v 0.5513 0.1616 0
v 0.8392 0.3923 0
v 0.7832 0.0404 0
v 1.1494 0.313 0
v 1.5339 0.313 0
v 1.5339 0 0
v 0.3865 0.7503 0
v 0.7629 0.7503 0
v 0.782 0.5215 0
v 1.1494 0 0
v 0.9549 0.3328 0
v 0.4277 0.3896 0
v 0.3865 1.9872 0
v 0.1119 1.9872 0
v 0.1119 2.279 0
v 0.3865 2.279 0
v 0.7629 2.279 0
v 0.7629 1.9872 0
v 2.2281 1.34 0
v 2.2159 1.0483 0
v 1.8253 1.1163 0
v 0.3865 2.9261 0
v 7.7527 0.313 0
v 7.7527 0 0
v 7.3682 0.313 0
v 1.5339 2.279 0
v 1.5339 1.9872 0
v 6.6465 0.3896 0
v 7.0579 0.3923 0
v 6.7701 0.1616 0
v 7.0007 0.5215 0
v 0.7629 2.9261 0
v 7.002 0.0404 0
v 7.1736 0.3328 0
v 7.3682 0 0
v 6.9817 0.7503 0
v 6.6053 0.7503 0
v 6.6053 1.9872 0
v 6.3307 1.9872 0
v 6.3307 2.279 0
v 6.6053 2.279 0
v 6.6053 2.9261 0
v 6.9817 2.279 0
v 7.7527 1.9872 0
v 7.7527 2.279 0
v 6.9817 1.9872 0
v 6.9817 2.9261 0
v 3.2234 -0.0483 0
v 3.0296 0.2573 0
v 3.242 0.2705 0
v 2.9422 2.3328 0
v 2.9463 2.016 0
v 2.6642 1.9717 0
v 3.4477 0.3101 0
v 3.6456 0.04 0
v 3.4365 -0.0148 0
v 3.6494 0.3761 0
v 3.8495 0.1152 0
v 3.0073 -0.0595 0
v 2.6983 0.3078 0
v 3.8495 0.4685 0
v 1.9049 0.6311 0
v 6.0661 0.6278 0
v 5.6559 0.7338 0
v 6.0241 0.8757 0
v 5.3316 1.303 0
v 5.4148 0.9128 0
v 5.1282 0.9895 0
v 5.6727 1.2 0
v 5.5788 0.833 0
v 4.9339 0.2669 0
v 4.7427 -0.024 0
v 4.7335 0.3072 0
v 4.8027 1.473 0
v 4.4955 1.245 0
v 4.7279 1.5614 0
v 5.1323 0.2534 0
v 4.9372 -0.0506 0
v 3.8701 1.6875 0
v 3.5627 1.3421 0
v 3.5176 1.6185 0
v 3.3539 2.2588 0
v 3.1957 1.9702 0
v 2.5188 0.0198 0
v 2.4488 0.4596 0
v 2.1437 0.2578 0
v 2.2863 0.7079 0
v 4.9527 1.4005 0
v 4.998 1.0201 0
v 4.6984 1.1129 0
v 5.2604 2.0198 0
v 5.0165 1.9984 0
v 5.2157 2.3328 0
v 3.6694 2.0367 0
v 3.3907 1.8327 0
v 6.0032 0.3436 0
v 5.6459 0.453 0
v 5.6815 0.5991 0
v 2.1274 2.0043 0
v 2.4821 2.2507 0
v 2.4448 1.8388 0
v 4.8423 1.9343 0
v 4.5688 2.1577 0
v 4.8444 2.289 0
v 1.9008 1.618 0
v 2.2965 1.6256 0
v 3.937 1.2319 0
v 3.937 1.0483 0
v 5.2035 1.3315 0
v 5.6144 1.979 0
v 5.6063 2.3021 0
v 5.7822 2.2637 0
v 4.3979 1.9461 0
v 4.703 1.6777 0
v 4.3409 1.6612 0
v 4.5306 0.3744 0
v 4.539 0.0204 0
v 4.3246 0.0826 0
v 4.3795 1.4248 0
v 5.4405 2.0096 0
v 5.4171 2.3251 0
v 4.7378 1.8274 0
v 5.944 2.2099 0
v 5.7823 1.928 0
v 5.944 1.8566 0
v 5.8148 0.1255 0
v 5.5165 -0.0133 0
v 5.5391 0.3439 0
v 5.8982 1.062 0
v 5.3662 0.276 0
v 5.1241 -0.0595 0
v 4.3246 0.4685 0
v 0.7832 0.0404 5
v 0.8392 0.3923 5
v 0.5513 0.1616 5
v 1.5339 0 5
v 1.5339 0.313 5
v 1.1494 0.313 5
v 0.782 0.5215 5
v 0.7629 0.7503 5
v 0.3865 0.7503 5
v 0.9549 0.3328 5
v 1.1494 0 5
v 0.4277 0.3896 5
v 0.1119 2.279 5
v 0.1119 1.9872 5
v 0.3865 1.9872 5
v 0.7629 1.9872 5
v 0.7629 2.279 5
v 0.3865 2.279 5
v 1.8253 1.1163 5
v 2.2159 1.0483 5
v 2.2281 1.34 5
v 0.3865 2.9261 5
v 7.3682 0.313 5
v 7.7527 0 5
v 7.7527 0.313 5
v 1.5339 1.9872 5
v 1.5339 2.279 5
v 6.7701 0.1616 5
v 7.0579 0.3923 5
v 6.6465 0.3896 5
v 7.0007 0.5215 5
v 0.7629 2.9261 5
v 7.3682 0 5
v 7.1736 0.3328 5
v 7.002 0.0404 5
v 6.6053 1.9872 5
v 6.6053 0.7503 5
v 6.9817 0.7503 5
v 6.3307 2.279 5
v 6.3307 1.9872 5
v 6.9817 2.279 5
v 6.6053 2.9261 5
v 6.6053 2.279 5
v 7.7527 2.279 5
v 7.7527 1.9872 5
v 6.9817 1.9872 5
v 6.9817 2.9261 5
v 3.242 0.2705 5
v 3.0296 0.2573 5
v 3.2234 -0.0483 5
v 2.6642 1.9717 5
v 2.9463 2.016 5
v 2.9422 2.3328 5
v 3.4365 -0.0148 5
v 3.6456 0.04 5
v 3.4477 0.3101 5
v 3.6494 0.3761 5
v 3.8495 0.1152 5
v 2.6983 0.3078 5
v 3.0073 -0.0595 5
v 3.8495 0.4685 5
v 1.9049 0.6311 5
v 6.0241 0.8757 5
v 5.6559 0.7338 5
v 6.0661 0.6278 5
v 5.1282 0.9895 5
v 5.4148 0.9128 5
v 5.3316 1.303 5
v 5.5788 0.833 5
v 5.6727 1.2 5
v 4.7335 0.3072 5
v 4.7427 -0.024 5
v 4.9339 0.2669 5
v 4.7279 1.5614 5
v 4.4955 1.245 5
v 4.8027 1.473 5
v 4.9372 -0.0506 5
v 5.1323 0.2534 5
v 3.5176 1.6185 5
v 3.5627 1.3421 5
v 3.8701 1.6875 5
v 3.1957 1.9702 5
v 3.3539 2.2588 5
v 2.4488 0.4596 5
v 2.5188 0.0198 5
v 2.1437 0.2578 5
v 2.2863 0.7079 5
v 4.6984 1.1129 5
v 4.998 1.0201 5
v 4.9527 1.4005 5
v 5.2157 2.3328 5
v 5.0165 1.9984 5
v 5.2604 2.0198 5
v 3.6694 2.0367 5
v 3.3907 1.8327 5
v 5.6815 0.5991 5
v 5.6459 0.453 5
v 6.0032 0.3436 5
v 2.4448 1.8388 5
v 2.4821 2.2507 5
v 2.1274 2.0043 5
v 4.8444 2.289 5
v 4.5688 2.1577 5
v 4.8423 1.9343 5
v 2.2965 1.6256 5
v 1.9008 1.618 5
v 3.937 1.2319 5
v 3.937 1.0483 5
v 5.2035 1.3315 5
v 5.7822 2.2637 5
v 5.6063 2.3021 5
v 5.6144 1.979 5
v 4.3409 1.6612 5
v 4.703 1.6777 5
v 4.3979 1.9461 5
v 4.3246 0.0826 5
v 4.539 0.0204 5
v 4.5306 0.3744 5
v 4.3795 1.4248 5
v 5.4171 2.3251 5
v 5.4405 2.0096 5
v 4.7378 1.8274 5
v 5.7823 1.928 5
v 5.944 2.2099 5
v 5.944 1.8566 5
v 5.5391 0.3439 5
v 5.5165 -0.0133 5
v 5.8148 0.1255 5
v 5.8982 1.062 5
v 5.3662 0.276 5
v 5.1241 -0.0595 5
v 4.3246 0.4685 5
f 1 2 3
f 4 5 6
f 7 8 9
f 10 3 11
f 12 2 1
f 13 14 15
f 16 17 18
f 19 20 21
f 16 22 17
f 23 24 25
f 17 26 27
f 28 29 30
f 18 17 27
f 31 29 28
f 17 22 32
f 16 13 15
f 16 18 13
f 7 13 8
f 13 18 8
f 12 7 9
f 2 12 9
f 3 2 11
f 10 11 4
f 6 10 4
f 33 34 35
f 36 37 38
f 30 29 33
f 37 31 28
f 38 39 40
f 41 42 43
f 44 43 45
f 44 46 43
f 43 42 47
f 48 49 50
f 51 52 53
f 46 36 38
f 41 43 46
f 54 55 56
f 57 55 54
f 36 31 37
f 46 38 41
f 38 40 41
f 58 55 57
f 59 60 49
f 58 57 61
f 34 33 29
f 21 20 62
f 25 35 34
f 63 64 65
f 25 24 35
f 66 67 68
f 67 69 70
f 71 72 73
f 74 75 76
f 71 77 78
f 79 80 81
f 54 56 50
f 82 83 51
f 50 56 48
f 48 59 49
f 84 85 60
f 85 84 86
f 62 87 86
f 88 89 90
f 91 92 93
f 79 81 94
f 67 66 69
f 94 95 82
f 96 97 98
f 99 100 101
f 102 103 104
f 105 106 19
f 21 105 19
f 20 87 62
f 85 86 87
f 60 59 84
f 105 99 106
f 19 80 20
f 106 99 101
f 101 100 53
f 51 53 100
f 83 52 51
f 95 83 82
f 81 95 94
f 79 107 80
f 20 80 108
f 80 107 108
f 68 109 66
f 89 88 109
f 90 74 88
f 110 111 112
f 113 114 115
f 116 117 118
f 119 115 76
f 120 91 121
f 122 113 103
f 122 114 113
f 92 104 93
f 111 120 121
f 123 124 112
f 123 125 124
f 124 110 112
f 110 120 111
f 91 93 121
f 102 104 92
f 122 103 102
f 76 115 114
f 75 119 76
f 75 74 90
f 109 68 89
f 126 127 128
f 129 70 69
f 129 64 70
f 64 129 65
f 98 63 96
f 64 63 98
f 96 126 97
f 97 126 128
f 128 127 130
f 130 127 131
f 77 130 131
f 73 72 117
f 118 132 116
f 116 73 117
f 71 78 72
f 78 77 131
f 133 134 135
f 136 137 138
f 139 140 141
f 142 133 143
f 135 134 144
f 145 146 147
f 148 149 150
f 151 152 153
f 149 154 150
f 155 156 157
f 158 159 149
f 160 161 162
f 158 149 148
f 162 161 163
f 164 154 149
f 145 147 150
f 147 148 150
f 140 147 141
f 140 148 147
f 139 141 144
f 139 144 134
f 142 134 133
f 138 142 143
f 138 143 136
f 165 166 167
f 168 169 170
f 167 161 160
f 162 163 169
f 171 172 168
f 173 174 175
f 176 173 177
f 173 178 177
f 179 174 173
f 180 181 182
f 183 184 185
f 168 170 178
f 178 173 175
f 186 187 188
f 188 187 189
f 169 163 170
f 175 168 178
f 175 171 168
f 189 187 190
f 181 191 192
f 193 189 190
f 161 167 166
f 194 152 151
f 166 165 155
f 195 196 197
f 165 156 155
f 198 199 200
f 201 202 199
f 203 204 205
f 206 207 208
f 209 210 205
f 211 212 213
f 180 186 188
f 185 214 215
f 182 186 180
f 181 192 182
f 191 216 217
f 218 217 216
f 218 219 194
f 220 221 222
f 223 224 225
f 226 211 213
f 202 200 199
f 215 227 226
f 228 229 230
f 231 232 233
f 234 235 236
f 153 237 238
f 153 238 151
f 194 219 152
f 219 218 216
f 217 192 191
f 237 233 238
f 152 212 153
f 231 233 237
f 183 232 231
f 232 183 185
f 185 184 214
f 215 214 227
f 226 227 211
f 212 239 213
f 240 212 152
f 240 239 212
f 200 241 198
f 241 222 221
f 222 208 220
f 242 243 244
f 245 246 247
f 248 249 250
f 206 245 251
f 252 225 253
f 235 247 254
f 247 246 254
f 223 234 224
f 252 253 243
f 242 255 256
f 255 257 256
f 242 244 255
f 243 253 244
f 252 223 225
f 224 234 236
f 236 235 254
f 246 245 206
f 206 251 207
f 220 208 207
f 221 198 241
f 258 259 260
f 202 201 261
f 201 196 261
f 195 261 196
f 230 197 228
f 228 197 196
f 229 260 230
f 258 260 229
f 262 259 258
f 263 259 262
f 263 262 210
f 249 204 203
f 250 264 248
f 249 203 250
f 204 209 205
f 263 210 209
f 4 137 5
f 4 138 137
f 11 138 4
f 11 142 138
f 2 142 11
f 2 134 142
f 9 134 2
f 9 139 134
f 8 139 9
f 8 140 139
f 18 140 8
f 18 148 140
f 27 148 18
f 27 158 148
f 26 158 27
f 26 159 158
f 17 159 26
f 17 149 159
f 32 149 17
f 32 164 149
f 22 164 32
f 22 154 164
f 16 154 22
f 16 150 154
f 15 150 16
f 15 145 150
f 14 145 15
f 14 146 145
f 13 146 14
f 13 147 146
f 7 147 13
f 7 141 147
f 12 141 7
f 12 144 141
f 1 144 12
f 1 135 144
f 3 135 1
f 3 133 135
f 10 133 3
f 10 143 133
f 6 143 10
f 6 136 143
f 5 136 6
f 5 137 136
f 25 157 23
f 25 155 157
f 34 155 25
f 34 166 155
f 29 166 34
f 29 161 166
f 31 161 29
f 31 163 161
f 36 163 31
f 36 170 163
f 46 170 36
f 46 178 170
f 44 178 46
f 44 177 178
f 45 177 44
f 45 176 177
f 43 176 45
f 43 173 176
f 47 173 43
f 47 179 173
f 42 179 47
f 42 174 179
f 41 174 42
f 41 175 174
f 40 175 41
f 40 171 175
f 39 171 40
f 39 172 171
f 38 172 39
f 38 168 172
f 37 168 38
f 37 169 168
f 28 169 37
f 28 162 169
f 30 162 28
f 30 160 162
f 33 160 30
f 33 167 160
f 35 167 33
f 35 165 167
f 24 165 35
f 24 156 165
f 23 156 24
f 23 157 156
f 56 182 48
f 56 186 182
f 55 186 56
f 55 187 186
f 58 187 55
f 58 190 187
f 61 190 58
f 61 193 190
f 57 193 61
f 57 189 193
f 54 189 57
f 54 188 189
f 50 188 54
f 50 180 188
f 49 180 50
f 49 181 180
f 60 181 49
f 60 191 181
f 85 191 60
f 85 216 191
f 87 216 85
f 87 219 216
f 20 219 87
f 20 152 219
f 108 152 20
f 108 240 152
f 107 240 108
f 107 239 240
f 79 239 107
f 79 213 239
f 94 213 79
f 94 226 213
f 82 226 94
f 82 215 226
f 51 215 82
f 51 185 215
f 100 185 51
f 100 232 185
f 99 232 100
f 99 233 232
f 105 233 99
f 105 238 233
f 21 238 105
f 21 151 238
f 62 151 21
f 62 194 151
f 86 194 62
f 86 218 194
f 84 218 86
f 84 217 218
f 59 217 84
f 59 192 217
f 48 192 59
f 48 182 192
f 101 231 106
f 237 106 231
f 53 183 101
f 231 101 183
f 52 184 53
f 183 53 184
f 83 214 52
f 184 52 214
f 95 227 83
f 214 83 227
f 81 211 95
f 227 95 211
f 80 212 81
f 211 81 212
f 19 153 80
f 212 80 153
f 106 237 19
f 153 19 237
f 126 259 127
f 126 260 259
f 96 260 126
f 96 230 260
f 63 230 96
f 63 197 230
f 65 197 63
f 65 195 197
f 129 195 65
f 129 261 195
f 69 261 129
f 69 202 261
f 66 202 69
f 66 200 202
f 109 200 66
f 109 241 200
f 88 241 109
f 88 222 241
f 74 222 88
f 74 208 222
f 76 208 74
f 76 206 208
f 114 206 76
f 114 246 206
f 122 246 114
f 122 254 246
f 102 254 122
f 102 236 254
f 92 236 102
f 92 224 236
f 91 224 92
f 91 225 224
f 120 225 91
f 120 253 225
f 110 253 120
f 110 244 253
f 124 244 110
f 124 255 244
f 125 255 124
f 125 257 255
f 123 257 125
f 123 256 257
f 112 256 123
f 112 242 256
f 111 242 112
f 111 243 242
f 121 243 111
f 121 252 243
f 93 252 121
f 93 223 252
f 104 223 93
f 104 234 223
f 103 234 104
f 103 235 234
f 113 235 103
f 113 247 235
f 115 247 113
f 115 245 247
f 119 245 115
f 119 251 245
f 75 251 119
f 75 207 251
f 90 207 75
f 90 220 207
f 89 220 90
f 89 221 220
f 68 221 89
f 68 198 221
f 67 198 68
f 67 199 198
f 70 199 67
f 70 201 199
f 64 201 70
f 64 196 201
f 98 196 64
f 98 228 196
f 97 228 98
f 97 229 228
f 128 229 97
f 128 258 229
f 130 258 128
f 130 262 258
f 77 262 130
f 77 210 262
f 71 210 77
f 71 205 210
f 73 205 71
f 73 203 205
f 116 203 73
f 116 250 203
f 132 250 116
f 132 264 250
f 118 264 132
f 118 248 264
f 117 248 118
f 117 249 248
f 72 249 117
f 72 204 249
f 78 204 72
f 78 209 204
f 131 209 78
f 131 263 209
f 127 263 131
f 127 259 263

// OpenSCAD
texte_a_inserer = "test"; 
taille = 3; 
police = "AbrilFatface"; //[[Abril Fatface,Aclonica,Acme,Advent Pro,Akronim,Aladin,Alegreya,Alegreya Sans,Alegreya SC,Alex Brush,Alfa Slab One,Alice,Amaranth,Architects Daughter,Archivo Black,Archivo Narrow,Arimo,Arvo,Asap,Astloch,Asul,Averia Libre,Averia Serif Libre,Bangers,Basic,Belgrano,Berkshire Swash,Bigshot One,Bilbo Swash Caps,Black Ops One,Bonbon,Bowlby One SC,Brawler,Bubblegum Sans,Butterfly Kids,Cabin Condensed,Caesar Dressing,Cagliostro,Calligraffitti,Capriola,Carter One,Changa One,Chango,Chelsea Market,Cherry Cream Soda,Chewy,Chicle,Chivo,Clicker Script,Coming Soon,Concert One,Condiment,Cookie,Courgette,Covered By Your Grace,Crimson Text,Dancing Script,DejaVu Sans,DejaVu Serif,Dhurjati,Doppio One,Dosis,Droid Sans,Eagle Lake,Electrolize,Emilys Candy,Encode Sans,Encode Sans Compressed,Euphoria Script,Exo,Exo 2,Faster One,Federo,Finger Paint,Fjord One,Fontdiner Swanky,Freckle Face,Fruktur,Gabriela,Geo,Germania One,Give You Glory,Gloria Hallelujah,Goudy Bookletter 1911,Graduate,Grand Hotel,Great Vibes,Griffy,Hanalei Fill,Happy Monkey,Henny Penny,Hind,IM Fell English SC,Indie Flower,Irish Grover,Italianno,Jacques Francois Shadow,Jolly Lodger,Josefin Slab,Joti One,Judson,Just Another Hand,Kalam,Kameron,Karma,Kavoon,Knewave,Kranky,Kristi,Laila,Lakki Reddy,Lancelot,Lato,Leckerli One,Ledger,Lekton,Lemon One,Liberation Sans,Libre Caslon Text,Life Savers,Lilita One,Lily Script One,Limelight,Lobster,Lobster Two,Londrina Outline,Londrina Shadow,Londrina Solid,Lora,Love Ya Like A Sister,Loved by the King,Lovers Quarrel,Luckiest Guy,Lusitana,Macondo,Macondo Swash Caps,Mako,Marck Script,Margarine,Marko One,Maven Pro,McLaren,MedievalSharp,Merienda One,Merriweather,Mervale Script,Metal Mania,Metrophobic,Milonga,Miltonian Tattoo,Miss Fajardose,Molle,Montez,Montserrat,Mr De Haviland,Mystery Quest,Neucha,New Rocker,Niconne,Nosifer,Nothing You Could Do,Noto Sans Oriya,Noto Serif,Nova Square,Nunito,Old Standard TT,Oleo Script,Oleo Script Swash Caps,Orbitron,Oregano,Orienta,Original Surfer,Oswald,Over the Rainbow,Overlock,Oxygen,Pacifico,Paprika,Parisienne,Patrick Hand SC,Paytone One,Peralta,Permanent Marker,Piedra,Pirata One,Play,Playball,Poetsen One,Poppins,Press Start 2P,Princess Sofia,PT Mono,Qwigley,Racing Sans One,Raleway,Rancho,Ranga,Ribeye,Roboto,Roboto Condensed,Roboto Slab,Rochester,Rock Salt,Rubik One,Sail,Salsa,Sansita One,Sarina,Satisfy,Schoolbell,Seaweed Script,Sevillana,Shadows Into Light,Shadows Into Light Two,Share,Six Caps,Skranji,Source Sans Pro,Spicy Rice,Stardos Stencil,Stoke,Syncopate,Teko,Terminal Dosis,The Girl Next Door,Tillana,Timmana,Titillium Web,Ubuntu,Ultra,Underdog,UnifrakturCook,UnifrakturMaguntia,Vampiro One,Vidaloka,Viga,Voces,Volkhov,Vollkorn,Voltaire,Waiting for the Sunrise,Wallpoet,Wellfleet,Wendy One,Yellowtail,Yesteryear,Zeyada]]
hauteur = 5; 
module rendu(){
linear_extrude(hauteur) text(texte_a_inserer,size = taille, font = police);
}
rendu();
 
